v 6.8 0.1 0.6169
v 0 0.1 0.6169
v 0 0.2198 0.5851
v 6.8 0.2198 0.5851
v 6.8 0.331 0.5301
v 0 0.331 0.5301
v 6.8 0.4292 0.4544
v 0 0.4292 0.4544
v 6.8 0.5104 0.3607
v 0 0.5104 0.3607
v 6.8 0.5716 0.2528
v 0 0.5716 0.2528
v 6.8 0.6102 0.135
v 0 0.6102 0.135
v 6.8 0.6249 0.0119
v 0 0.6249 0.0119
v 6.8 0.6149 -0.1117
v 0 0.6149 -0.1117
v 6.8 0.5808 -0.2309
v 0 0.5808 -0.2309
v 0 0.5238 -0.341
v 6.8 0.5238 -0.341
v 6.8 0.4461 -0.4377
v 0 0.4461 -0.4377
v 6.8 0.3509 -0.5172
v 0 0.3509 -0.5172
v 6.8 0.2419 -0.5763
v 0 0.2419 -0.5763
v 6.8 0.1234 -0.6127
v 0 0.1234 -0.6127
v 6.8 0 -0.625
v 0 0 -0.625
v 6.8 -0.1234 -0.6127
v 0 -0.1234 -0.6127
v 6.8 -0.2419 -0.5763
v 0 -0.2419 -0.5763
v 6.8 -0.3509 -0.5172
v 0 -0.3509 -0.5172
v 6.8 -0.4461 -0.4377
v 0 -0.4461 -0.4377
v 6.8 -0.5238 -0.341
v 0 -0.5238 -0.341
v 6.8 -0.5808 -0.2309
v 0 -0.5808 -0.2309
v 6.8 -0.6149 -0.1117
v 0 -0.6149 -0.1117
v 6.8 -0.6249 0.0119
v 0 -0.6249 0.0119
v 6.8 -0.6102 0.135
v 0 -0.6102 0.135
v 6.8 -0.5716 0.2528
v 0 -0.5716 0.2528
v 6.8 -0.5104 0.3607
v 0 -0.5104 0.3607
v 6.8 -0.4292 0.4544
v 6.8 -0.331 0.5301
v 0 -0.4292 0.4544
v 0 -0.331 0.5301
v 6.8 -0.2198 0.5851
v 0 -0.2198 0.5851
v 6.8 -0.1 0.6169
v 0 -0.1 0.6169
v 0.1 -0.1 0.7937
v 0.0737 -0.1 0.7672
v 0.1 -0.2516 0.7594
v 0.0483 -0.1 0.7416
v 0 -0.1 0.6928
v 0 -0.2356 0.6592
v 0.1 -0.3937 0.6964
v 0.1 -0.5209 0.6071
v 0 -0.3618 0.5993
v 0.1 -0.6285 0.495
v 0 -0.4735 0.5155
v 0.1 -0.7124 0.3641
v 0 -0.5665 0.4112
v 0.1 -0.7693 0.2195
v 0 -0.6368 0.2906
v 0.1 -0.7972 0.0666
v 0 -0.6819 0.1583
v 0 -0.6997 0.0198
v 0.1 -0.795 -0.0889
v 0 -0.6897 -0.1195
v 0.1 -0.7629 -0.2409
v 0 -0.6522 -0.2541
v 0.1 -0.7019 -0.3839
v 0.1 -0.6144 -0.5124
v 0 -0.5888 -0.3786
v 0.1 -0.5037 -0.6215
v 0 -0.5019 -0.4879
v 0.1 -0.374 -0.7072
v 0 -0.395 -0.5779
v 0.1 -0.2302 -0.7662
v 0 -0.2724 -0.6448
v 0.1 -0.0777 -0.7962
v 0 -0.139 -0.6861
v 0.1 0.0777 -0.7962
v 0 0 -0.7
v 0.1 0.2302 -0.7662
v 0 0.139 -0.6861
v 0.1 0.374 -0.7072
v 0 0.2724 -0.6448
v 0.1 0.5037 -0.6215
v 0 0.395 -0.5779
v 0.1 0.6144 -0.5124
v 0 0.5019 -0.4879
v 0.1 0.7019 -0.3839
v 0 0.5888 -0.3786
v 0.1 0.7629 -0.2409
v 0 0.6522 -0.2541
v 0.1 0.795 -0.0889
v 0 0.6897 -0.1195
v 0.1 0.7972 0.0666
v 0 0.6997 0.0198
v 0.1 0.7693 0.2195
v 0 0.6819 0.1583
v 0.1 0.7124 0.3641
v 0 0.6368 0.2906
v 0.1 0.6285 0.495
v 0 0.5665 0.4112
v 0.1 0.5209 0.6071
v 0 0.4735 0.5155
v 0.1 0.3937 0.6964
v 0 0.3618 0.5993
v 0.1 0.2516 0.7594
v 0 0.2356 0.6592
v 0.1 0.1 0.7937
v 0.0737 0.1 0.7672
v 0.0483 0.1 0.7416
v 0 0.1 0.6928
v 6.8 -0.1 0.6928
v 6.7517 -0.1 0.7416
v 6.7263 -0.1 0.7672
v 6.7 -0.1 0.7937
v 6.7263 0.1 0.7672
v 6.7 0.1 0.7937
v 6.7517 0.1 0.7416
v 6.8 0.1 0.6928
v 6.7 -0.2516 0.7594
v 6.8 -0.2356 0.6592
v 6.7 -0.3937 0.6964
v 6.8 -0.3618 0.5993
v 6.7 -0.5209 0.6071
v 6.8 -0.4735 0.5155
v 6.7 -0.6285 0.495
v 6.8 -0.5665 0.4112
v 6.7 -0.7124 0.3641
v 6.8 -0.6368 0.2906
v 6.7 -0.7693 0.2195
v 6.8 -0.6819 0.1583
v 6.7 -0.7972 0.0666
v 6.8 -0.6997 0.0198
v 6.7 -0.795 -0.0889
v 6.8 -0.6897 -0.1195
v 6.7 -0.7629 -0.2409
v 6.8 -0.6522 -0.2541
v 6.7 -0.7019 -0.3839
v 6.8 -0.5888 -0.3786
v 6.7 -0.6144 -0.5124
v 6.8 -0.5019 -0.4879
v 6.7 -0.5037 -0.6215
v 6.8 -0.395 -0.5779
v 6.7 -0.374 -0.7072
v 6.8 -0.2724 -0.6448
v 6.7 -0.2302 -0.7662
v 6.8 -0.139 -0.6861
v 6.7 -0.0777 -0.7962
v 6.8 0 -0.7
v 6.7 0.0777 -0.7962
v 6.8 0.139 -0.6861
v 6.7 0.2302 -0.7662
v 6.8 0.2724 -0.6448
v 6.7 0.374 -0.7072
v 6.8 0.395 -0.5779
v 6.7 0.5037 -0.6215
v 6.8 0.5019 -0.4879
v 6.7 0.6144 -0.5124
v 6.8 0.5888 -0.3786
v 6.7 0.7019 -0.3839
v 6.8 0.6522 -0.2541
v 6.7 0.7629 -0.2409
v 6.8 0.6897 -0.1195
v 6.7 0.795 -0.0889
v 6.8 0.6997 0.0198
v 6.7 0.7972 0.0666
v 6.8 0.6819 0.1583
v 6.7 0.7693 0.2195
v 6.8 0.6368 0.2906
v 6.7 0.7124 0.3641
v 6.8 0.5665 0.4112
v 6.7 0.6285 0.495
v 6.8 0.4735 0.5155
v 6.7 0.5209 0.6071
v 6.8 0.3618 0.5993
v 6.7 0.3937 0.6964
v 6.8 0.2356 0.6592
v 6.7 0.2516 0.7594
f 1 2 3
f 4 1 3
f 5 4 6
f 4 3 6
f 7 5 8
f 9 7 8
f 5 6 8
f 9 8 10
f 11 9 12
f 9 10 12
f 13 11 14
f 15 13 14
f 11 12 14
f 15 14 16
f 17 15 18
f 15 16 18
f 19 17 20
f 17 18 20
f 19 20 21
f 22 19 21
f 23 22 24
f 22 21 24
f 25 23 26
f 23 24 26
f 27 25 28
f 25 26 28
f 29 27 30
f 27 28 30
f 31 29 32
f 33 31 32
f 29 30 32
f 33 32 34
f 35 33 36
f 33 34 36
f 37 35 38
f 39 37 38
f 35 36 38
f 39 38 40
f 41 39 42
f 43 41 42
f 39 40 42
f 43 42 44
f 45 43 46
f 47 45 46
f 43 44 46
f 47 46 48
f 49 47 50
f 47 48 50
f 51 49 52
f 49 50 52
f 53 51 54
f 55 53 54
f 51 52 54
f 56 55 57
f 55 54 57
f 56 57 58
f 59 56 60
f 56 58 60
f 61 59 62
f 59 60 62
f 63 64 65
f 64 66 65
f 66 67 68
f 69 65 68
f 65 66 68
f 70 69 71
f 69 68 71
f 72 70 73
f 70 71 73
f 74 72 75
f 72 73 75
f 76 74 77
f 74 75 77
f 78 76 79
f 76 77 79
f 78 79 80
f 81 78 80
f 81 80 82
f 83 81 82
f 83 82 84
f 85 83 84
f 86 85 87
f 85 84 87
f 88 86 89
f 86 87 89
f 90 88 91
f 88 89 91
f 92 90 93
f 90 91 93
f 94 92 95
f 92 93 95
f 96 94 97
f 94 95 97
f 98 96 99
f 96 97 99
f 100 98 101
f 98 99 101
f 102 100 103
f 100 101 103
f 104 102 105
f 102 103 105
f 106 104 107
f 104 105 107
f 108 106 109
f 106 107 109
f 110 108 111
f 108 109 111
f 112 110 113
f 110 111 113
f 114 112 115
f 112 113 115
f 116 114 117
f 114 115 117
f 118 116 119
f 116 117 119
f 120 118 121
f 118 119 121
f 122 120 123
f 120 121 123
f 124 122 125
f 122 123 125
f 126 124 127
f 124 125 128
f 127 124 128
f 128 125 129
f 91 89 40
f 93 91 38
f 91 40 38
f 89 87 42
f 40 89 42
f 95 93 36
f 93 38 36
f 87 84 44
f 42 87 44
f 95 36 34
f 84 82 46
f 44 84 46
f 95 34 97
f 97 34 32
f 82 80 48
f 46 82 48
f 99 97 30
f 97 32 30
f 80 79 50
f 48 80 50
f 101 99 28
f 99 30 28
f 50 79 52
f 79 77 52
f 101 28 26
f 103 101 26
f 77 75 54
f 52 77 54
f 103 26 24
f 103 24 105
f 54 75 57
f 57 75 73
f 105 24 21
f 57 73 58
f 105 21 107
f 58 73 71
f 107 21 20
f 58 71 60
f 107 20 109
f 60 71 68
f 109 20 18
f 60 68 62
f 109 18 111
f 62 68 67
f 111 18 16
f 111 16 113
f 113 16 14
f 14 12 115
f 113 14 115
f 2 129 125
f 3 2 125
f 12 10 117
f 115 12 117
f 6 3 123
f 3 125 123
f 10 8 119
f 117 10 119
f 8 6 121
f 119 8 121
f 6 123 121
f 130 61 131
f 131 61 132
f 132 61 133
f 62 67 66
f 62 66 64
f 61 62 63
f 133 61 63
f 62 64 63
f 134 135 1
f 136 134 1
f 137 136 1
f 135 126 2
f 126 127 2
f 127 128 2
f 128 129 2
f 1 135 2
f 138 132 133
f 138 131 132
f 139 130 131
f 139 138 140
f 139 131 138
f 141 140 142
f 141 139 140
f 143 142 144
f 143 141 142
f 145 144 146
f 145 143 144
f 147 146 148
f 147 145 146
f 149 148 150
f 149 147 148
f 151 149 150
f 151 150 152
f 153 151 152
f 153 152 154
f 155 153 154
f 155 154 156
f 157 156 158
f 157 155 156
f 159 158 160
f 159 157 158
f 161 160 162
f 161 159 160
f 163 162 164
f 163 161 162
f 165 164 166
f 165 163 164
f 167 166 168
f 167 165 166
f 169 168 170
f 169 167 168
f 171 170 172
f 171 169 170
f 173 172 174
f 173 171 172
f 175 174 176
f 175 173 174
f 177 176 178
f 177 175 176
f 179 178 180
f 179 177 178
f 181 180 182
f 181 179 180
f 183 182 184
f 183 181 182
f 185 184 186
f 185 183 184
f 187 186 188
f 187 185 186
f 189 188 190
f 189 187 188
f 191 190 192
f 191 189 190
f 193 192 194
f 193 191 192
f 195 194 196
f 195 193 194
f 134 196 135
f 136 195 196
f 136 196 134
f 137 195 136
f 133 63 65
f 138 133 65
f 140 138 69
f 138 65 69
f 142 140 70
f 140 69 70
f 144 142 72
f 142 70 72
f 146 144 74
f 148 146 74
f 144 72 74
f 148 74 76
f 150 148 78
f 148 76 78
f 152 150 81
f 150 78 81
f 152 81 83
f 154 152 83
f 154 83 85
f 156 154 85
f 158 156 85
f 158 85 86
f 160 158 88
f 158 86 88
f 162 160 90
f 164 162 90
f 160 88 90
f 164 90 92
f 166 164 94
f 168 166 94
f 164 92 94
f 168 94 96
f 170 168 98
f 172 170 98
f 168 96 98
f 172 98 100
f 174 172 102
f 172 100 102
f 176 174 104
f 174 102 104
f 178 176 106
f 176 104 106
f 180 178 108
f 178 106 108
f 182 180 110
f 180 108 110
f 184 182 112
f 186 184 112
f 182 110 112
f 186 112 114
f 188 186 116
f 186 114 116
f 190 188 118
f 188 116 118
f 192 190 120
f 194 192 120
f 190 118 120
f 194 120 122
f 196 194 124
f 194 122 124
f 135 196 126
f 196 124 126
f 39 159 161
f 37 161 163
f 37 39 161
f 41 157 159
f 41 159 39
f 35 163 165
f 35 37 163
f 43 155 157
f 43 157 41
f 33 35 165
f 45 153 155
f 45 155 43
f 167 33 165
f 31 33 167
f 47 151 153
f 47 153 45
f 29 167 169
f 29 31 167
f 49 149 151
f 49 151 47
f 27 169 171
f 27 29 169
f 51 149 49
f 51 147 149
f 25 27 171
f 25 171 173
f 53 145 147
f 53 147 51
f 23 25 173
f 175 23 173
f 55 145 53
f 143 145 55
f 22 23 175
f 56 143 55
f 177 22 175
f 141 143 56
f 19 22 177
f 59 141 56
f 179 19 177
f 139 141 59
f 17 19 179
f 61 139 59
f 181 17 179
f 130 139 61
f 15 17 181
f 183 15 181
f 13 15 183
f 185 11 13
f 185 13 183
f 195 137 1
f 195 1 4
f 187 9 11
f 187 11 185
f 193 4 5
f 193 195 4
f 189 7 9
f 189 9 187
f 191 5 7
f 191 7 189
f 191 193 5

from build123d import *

# Parameters (mm, degrees)
F1_DEPTH = 6.8
F2_SIZE  = 0.1
F3_SIZE  = 0.1


with BuildPart() as f1:
    # F0 (on Right) → F1 (new body)
    with BuildSketch(Plane.YZ):
        with BuildLine():
            ThreePointArc((0.1, 0.616948), (0, -0.625), (-0.1, 0.616948))
            Line((-0.1, 0.616948), (-0.1, 0.793725))
            ThreePointArc((-0.1, 0.793725), (0, -0.8), (0.1, 0.793725))
            Line((0.1, 0.793725), (0.1, 0.616948))
        make_face()
    extrude(amount=F1_DEPTH)

    # F2
    f2_edges = [f1.edges().sort_by_distance(p)[0] for p in [
        (6.8, 0, -0.8),
    ]]
    chamfer(f2_edges, length=F2_SIZE)

    # F3
    f3_edges = [f1.edges().sort_by_distance(p)[0] for p in [
        (0, 0, -0.8),
    ]]
    chamfer(f3_edges, length=F3_SIZE)


solid = f1.part
